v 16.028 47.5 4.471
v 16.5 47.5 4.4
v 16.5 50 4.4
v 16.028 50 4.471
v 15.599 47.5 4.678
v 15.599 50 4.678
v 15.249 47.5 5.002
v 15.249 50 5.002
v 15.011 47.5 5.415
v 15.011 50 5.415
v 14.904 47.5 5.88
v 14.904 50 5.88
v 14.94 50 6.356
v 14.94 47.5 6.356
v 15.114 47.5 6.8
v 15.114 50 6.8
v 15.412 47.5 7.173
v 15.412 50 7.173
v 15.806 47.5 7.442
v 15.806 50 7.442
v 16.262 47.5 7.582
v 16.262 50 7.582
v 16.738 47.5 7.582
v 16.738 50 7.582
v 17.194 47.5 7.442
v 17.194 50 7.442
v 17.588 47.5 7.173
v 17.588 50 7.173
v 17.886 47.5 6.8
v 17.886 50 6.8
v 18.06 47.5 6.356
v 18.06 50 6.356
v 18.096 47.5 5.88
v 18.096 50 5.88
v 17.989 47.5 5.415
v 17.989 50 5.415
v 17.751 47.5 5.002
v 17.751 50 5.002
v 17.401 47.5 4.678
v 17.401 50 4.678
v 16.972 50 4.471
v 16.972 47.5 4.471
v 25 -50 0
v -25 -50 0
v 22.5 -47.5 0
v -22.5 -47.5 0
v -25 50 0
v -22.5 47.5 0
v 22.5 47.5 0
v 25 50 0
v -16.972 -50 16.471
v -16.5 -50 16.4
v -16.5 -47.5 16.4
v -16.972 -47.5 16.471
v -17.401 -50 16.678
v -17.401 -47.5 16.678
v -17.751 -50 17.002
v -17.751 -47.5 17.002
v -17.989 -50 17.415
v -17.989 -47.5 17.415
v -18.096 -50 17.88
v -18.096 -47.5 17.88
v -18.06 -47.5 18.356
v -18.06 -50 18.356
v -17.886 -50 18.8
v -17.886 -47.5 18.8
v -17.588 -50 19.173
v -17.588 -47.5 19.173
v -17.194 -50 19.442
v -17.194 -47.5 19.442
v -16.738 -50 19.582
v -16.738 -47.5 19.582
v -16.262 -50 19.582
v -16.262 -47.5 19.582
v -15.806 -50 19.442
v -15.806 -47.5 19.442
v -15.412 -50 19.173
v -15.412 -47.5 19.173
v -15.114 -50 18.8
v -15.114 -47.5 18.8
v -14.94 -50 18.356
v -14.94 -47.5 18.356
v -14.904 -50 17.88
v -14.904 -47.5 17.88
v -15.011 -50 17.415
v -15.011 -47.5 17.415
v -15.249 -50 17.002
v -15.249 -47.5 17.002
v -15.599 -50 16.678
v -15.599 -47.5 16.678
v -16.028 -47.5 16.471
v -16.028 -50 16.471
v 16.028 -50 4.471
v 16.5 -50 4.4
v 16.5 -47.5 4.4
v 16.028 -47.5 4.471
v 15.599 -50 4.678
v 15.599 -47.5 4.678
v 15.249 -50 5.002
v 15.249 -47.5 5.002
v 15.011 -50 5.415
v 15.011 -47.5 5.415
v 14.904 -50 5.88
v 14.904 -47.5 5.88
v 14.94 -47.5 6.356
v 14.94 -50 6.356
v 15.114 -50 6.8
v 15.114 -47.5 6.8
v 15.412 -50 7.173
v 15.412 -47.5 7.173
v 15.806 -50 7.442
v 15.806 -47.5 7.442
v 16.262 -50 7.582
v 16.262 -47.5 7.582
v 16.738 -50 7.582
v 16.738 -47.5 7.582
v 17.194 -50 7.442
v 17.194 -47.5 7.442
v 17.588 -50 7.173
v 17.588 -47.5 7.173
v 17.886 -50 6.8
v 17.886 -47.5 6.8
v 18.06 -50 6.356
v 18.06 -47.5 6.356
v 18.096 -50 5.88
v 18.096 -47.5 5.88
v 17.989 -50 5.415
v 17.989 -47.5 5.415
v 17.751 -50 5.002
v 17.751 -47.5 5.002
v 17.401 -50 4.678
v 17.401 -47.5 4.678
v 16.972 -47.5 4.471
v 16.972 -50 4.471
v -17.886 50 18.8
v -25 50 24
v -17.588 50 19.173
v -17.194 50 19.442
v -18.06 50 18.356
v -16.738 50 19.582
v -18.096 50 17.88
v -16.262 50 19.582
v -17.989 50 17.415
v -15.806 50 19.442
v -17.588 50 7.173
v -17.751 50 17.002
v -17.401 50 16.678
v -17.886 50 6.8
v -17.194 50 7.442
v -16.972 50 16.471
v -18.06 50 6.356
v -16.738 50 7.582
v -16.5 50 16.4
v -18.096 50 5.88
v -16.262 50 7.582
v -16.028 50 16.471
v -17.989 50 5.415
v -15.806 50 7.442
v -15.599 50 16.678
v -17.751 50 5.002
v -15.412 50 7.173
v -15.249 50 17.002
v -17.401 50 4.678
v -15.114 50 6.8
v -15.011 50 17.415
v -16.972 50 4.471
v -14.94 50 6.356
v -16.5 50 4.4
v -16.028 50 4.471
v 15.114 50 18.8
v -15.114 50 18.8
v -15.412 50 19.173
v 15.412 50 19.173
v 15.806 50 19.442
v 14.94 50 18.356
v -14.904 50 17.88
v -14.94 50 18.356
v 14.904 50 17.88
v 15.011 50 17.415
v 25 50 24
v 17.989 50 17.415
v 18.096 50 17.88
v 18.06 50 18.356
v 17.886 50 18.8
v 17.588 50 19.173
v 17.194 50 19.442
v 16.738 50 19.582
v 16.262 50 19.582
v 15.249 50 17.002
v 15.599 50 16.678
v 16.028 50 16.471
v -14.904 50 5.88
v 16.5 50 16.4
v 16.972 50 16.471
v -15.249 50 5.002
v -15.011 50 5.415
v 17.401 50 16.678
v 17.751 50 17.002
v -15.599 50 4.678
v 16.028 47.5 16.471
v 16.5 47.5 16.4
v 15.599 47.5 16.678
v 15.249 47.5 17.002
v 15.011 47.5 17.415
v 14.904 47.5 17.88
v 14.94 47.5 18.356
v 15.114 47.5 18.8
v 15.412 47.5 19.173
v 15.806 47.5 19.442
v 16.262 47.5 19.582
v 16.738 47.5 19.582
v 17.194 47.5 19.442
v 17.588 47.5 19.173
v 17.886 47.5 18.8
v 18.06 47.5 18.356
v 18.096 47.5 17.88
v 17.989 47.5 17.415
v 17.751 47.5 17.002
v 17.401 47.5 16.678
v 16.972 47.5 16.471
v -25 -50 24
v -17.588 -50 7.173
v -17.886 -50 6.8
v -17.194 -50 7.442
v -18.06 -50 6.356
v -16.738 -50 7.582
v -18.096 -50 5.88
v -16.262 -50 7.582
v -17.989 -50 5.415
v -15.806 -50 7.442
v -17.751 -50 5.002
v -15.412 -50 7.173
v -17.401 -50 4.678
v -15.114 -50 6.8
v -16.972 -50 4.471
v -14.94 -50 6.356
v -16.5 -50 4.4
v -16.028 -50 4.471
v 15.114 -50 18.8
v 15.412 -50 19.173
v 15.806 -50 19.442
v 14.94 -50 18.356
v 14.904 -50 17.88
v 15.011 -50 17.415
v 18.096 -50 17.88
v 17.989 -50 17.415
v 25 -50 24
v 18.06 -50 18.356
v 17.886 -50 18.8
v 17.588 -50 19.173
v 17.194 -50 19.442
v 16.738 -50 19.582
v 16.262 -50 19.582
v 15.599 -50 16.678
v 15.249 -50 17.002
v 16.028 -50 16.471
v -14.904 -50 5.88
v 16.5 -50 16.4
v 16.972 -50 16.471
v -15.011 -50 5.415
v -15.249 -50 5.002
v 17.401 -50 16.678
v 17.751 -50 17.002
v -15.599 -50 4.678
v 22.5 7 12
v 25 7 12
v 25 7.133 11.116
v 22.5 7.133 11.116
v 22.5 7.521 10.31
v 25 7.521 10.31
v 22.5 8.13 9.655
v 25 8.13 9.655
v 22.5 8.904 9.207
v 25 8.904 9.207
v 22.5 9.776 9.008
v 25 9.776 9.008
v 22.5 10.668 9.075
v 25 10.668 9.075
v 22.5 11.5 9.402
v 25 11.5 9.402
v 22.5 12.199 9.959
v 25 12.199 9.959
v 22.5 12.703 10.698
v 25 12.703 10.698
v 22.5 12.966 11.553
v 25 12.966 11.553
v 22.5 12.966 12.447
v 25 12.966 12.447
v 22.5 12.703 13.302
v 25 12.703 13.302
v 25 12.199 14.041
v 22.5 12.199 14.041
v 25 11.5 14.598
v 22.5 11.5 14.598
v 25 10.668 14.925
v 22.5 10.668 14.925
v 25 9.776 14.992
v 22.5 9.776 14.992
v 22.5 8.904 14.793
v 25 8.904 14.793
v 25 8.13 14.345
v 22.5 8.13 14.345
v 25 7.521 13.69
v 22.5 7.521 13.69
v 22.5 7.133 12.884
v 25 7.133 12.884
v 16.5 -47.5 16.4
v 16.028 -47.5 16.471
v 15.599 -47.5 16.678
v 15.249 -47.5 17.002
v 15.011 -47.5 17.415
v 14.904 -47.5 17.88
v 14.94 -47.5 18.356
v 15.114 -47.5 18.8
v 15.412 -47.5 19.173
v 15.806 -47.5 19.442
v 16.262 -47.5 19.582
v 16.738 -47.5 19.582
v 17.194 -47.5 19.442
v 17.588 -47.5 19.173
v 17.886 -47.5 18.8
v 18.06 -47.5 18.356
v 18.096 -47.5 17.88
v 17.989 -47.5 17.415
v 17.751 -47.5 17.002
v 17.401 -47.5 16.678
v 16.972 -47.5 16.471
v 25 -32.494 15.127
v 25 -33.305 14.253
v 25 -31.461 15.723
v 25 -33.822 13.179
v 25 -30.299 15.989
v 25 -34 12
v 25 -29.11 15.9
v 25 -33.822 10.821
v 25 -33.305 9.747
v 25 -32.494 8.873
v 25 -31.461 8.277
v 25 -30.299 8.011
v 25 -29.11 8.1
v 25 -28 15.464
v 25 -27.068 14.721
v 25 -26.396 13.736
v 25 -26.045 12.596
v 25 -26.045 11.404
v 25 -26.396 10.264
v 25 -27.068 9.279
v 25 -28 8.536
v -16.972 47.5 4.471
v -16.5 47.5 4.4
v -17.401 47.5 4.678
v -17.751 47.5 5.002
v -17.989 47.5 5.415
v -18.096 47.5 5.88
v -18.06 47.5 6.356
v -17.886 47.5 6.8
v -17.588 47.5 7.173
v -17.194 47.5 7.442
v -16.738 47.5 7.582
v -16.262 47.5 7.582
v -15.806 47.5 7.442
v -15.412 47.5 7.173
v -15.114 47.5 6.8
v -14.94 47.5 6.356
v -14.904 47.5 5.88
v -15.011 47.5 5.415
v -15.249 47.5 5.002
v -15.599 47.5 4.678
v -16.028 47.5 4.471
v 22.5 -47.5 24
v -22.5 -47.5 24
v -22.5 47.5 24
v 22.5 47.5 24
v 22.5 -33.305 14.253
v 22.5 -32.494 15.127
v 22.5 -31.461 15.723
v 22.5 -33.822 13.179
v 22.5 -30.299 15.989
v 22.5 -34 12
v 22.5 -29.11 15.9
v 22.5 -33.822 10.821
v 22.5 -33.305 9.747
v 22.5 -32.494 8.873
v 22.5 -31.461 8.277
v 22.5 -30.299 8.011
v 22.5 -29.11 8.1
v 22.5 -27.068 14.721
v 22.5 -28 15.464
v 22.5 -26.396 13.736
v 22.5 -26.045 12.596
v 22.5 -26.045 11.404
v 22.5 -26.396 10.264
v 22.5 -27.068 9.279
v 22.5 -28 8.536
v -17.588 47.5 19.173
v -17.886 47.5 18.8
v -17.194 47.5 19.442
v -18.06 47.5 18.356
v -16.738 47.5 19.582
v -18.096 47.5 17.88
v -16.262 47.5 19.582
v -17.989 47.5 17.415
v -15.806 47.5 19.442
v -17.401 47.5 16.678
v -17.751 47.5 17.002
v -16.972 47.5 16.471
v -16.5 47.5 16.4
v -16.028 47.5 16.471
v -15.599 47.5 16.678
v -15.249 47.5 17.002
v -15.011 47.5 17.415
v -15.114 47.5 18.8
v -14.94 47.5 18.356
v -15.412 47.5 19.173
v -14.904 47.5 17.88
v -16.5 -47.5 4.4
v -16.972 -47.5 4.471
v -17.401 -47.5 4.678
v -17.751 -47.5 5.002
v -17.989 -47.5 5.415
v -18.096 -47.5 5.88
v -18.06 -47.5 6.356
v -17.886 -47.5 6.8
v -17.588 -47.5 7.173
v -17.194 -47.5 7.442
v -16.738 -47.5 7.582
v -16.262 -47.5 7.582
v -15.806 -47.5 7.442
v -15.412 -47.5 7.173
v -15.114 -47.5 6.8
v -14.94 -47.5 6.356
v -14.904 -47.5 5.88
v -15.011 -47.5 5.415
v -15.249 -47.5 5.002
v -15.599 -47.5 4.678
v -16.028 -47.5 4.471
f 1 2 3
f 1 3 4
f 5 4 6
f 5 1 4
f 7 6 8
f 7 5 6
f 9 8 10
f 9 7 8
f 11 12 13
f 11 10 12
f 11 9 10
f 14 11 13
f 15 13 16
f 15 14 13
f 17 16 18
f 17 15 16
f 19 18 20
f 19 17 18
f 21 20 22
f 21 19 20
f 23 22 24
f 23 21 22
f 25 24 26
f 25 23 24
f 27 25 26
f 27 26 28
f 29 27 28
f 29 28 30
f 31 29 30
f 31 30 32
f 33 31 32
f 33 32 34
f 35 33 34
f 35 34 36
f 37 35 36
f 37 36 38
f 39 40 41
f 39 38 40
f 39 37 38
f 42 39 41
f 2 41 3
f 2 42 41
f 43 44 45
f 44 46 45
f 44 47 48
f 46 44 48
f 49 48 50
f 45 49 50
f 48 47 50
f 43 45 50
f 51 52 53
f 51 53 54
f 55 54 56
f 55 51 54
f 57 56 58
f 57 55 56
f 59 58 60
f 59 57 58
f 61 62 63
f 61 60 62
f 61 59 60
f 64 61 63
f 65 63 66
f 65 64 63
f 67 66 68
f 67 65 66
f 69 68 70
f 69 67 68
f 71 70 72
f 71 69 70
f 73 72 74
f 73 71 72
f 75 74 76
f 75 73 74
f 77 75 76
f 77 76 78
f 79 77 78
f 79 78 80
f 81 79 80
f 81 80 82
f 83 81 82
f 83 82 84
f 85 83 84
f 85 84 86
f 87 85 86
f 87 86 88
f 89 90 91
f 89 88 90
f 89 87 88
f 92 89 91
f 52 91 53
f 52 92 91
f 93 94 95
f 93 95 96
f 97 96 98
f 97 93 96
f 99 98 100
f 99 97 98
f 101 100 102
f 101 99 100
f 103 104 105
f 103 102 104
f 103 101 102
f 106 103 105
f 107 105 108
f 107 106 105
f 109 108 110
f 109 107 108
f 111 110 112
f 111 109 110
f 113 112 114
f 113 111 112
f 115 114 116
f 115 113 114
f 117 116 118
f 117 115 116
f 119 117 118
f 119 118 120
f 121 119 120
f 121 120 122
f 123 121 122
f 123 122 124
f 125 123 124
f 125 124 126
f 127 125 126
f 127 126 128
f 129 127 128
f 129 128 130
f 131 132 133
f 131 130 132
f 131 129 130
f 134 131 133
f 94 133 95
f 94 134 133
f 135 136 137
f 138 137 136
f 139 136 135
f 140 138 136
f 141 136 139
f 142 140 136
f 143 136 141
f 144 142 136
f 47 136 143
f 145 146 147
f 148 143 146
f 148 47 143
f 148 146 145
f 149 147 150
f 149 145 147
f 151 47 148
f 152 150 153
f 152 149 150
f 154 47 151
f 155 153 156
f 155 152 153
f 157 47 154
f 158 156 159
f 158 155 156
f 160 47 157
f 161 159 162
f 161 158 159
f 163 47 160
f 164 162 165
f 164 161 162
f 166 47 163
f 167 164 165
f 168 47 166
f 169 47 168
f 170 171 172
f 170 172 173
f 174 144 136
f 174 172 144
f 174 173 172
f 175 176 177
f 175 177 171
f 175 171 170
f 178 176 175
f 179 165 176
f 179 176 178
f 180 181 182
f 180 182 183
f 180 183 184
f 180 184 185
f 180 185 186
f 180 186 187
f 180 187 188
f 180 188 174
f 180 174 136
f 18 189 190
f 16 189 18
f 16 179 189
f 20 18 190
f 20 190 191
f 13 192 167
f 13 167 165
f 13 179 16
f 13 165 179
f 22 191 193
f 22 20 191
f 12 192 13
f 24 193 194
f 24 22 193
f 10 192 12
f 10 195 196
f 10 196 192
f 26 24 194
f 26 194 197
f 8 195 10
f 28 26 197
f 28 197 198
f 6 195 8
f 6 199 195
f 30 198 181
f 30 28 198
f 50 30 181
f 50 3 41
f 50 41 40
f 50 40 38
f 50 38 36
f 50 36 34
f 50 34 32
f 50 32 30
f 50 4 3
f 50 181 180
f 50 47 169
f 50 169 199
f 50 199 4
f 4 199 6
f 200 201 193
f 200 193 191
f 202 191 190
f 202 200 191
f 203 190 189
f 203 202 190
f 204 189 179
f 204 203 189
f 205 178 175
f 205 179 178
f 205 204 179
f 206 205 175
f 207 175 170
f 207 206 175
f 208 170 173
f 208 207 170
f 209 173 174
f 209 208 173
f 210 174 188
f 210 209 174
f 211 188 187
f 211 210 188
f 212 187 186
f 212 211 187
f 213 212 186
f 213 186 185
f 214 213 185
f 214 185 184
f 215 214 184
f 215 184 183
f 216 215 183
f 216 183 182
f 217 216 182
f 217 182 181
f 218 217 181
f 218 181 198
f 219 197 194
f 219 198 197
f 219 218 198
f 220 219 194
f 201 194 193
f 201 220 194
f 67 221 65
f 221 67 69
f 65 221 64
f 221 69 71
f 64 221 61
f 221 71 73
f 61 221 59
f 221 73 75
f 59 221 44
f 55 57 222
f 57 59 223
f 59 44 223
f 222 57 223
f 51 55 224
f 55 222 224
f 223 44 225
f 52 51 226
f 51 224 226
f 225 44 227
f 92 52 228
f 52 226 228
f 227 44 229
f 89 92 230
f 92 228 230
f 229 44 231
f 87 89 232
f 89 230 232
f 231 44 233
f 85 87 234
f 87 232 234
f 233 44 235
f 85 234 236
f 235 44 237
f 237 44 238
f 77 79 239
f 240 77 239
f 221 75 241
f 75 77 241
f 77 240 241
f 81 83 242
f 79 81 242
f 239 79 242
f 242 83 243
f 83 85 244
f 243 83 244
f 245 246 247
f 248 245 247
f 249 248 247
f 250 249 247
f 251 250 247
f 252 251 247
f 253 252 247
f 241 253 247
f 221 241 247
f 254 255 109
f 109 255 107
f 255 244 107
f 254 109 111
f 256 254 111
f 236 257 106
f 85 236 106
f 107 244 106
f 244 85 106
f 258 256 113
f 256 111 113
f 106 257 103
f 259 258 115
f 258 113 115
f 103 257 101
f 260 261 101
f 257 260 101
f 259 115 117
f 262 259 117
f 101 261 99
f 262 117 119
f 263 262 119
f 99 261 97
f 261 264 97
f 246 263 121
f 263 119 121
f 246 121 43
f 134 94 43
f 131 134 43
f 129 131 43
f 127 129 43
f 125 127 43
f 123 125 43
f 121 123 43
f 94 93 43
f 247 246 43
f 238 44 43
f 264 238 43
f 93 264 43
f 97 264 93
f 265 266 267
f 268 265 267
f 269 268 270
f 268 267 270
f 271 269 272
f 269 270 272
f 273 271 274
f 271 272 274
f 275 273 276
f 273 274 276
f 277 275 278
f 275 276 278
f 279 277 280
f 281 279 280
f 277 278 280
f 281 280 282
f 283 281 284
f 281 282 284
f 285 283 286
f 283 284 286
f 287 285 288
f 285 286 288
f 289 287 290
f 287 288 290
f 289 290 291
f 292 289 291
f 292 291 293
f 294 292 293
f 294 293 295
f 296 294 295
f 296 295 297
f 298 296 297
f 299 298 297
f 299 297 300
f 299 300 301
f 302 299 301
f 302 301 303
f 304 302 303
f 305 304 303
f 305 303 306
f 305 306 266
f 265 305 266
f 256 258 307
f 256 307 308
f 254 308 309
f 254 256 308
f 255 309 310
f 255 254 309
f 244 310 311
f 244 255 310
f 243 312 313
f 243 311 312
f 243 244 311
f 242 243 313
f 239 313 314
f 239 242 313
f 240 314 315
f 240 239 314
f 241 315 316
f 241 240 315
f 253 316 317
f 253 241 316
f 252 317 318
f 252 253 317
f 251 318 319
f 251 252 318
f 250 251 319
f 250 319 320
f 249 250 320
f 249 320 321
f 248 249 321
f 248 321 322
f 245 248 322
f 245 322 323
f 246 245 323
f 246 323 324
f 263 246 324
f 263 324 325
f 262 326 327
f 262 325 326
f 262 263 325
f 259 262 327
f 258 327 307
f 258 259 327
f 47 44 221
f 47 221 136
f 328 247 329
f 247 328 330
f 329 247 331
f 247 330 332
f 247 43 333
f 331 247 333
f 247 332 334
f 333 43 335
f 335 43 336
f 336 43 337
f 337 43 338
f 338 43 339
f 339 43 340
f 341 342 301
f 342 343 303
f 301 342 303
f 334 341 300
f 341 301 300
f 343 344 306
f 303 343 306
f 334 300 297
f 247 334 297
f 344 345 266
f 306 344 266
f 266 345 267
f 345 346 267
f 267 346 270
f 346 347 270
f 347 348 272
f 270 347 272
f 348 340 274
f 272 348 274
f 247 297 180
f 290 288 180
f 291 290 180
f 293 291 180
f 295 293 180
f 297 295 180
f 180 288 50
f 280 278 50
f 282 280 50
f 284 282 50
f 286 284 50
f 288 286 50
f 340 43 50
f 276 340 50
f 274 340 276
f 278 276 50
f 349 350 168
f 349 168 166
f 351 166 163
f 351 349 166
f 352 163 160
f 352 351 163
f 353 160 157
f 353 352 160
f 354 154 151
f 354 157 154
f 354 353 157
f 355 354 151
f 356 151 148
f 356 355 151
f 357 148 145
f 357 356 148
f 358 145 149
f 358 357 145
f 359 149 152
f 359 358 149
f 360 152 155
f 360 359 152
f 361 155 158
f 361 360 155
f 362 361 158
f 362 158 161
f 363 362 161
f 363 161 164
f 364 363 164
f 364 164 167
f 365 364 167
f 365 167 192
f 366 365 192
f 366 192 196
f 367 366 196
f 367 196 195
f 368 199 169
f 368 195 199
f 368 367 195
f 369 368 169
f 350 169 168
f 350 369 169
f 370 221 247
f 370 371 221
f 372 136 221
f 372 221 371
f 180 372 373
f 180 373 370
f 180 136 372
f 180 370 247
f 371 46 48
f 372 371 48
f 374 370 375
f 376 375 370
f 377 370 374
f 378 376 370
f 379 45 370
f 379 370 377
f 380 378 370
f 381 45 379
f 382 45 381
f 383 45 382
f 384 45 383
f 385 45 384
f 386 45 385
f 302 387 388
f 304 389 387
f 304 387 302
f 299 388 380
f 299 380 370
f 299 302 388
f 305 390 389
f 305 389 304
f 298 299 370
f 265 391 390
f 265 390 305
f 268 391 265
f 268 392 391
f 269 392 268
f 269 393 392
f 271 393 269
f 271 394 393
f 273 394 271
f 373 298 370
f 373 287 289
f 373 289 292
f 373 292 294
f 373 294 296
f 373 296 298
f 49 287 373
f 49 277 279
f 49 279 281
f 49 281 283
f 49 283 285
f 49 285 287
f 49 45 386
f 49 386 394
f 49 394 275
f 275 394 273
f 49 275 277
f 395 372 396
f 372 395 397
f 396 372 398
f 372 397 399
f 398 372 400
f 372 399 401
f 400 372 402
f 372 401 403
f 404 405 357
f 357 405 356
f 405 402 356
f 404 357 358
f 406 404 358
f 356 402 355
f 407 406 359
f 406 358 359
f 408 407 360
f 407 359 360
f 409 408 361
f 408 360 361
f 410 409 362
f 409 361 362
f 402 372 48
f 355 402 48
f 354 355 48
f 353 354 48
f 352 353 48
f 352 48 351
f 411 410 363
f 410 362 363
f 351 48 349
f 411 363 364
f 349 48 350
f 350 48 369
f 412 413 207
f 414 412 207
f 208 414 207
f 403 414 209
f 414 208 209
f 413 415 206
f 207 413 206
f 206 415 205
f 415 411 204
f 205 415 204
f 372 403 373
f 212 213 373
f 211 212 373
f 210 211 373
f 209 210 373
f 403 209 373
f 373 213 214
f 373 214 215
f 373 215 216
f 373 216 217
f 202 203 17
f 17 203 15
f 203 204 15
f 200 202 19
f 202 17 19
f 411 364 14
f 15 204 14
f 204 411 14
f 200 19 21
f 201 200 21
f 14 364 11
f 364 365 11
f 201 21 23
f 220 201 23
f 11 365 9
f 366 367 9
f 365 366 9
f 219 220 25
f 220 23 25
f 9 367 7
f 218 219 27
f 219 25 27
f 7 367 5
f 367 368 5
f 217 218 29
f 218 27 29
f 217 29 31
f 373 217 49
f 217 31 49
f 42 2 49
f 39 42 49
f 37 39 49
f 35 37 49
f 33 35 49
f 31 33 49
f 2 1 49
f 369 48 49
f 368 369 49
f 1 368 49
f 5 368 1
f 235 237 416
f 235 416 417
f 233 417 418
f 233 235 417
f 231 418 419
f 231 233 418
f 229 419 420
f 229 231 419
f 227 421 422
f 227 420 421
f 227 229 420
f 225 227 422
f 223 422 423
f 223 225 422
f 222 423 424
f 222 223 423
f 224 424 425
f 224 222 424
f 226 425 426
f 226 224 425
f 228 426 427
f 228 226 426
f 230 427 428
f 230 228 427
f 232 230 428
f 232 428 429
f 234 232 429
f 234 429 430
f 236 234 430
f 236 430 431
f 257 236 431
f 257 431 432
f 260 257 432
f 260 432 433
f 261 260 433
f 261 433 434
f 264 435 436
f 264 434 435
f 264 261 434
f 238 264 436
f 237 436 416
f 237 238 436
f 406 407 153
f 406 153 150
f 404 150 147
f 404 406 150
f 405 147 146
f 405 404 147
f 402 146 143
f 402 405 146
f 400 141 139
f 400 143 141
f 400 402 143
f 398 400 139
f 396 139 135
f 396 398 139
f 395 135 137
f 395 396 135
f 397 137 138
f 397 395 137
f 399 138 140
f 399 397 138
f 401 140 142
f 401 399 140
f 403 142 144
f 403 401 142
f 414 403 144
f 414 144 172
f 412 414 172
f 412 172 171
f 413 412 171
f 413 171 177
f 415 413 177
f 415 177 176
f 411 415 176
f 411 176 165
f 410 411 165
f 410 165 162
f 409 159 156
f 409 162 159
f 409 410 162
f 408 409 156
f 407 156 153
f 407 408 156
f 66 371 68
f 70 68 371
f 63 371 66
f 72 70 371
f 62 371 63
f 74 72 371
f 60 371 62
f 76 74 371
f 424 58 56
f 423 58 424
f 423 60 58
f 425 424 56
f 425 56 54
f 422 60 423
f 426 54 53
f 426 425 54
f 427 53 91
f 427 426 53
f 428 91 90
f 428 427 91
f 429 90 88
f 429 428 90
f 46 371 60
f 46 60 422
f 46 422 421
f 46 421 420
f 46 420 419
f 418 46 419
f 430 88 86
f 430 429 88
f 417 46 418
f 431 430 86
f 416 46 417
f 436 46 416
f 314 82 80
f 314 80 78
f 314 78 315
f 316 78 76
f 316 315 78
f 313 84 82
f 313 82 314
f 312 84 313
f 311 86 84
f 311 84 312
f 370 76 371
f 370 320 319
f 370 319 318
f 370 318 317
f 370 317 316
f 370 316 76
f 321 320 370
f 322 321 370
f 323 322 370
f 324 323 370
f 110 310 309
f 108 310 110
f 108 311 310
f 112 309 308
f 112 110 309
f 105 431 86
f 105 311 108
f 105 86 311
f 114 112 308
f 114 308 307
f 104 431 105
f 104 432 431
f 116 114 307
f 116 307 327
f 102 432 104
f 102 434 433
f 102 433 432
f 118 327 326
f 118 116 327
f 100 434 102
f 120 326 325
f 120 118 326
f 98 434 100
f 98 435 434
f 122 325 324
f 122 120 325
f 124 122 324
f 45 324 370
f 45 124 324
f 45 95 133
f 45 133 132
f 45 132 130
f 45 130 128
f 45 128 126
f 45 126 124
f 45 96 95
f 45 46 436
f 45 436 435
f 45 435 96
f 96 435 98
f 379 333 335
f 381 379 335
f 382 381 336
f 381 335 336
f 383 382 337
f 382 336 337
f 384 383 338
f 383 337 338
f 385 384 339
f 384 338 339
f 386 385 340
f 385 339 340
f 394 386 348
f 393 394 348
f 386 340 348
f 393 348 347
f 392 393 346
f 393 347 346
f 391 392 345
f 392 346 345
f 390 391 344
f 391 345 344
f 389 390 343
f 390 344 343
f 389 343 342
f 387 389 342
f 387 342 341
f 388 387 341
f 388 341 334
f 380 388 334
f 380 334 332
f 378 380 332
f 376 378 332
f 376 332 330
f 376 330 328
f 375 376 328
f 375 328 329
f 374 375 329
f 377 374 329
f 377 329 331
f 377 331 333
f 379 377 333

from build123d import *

# Parameters (mm, degrees)
SKETCH_1_W                      = 50
SKETCH_1_H                      = 100
SKETCH_1_W_2                    = 45
SKETCH_1_H_2                    = 95
EXTRUDE_1_DEPTH                 = 24
CUT_EXTRUDE_2_DEPTH             = 106.834776893
CUT_EXTRUDE_2_DEPTH_BACK        = 106.834776893
SKETCH_3_R                      = 1.6
CUT_EXTRUDE_3_REACH             = 76.673
SKETCH_4_R                      = 3
SKETCH_4_R_2                    = 4
CUT_EXTRUDE_3_DIRECTION_2_DEPTH = 75.67261881


with BuildPart() as part:
    # ｽｹｯﾁ1 → ﾎﾞｽ - 押し出し1 (new body)
    with BuildSketch(Plane.XY):
        Rectangle(SKETCH_1_W, SKETCH_1_H)
        Rectangle(SKETCH_1_W_2, SKETCH_1_H_2, mode=Mode.SUBTRACT)
    extrude(amount=EXTRUDE_1_DEPTH)

    # ｽｹｯﾁ3 → ｶｯﾄ - 押し出し2 (cut, two sides: drawn at the far end of the back side and taken through both)
    with BuildSketch(Plane(origin=(0, 50, 0), x_dir=(1, 0, 0), z_dir=(0, 1, 0)).offset(-CUT_EXTRUDE_2_DEPTH_BACK)):
        with Locations(Location((-16.5, -6, 0), (0, 0, 90))):
            Circle(SKETCH_3_R)
        with Locations(Location((16.5, -6, 0), (0, 0, 90))):
            Circle(SKETCH_3_R)
        with Locations(Location((16.5, -18, 0), (0, 0, 90))):
            Circle(SKETCH_3_R)
        with Locations(Location((-16.5, -18, 0), (0, 0, 90))):
            Circle(SKETCH_3_R)
    extrude(amount=CUT_EXTRUDE_2_DEPTH + CUT_EXTRUDE_2_DEPTH_BACK, mode=Mode.SUBTRACT)

    # ｽｹｯﾁ4 → ｶｯﾄ - 押し出し3 (cut, up to next)
    with BuildSketch(Plane(origin=(25, 0, 0), x_dir=(0, 0, -1), z_dir=(1, 0, 0)), mode=Mode.PRIVATE) as cut_extrude_3_sk1:
        with Locations(Location((-12, 10, 0), (0, 0, 270))):
            Circle(SKETCH_4_R)
    cut_extrude_3_tool1 = extrude(cut_extrude_3_sk1.sketch, amount=-CUT_EXTRUDE_3_REACH, mode=Mode.PRIVATE) & part.part
    # ｽｹｯﾁ4 → ｶｯﾄ - 押し出し3 (cut, up to next)
    with BuildSketch(Plane(origin=(25, 0, 0), x_dir=(0, 0, -1), z_dir=(1, 0, 0)), mode=Mode.PRIVATE) as cut_extrude_3_sk2:
        with Locations(Location((-12, -30, 0), (0, 0, 270))):
            Circle(SKETCH_4_R_2)
    cut_extrude_3_tool2 = extrude(cut_extrude_3_sk2.sketch, amount=-CUT_EXTRUDE_3_REACH, mode=Mode.PRIVATE) & part.part
    add(cut_extrude_3_tool1.solids().sort_by_distance((25, 10, 12))[0], mode=Mode.SUBTRACT)
    add(cut_extrude_3_tool2.solids().sort_by_distance((25, -30, 12))[0], mode=Mode.SUBTRACT)

    # ｽｹｯﾁ4 → ｶｯﾄ - 押し出し3 direction 2 (cut)
    with BuildSketch(Plane(origin=(25, 0, 0), x_dir=(0, 0, -1), z_dir=(1, 0, 0))):
        with Locations(Location((-12, 10, 0), (0, 0, 270))):
            Circle(SKETCH_4_R)
        with Locations(Location((-12, -30, 0), (0, 0, 270))):
            Circle(SKETCH_4_R_2)
    extrude(amount=CUT_EXTRUDE_3_DIRECTION_2_DEPTH, mode=Mode.SUBTRACT)


solid = part.part
